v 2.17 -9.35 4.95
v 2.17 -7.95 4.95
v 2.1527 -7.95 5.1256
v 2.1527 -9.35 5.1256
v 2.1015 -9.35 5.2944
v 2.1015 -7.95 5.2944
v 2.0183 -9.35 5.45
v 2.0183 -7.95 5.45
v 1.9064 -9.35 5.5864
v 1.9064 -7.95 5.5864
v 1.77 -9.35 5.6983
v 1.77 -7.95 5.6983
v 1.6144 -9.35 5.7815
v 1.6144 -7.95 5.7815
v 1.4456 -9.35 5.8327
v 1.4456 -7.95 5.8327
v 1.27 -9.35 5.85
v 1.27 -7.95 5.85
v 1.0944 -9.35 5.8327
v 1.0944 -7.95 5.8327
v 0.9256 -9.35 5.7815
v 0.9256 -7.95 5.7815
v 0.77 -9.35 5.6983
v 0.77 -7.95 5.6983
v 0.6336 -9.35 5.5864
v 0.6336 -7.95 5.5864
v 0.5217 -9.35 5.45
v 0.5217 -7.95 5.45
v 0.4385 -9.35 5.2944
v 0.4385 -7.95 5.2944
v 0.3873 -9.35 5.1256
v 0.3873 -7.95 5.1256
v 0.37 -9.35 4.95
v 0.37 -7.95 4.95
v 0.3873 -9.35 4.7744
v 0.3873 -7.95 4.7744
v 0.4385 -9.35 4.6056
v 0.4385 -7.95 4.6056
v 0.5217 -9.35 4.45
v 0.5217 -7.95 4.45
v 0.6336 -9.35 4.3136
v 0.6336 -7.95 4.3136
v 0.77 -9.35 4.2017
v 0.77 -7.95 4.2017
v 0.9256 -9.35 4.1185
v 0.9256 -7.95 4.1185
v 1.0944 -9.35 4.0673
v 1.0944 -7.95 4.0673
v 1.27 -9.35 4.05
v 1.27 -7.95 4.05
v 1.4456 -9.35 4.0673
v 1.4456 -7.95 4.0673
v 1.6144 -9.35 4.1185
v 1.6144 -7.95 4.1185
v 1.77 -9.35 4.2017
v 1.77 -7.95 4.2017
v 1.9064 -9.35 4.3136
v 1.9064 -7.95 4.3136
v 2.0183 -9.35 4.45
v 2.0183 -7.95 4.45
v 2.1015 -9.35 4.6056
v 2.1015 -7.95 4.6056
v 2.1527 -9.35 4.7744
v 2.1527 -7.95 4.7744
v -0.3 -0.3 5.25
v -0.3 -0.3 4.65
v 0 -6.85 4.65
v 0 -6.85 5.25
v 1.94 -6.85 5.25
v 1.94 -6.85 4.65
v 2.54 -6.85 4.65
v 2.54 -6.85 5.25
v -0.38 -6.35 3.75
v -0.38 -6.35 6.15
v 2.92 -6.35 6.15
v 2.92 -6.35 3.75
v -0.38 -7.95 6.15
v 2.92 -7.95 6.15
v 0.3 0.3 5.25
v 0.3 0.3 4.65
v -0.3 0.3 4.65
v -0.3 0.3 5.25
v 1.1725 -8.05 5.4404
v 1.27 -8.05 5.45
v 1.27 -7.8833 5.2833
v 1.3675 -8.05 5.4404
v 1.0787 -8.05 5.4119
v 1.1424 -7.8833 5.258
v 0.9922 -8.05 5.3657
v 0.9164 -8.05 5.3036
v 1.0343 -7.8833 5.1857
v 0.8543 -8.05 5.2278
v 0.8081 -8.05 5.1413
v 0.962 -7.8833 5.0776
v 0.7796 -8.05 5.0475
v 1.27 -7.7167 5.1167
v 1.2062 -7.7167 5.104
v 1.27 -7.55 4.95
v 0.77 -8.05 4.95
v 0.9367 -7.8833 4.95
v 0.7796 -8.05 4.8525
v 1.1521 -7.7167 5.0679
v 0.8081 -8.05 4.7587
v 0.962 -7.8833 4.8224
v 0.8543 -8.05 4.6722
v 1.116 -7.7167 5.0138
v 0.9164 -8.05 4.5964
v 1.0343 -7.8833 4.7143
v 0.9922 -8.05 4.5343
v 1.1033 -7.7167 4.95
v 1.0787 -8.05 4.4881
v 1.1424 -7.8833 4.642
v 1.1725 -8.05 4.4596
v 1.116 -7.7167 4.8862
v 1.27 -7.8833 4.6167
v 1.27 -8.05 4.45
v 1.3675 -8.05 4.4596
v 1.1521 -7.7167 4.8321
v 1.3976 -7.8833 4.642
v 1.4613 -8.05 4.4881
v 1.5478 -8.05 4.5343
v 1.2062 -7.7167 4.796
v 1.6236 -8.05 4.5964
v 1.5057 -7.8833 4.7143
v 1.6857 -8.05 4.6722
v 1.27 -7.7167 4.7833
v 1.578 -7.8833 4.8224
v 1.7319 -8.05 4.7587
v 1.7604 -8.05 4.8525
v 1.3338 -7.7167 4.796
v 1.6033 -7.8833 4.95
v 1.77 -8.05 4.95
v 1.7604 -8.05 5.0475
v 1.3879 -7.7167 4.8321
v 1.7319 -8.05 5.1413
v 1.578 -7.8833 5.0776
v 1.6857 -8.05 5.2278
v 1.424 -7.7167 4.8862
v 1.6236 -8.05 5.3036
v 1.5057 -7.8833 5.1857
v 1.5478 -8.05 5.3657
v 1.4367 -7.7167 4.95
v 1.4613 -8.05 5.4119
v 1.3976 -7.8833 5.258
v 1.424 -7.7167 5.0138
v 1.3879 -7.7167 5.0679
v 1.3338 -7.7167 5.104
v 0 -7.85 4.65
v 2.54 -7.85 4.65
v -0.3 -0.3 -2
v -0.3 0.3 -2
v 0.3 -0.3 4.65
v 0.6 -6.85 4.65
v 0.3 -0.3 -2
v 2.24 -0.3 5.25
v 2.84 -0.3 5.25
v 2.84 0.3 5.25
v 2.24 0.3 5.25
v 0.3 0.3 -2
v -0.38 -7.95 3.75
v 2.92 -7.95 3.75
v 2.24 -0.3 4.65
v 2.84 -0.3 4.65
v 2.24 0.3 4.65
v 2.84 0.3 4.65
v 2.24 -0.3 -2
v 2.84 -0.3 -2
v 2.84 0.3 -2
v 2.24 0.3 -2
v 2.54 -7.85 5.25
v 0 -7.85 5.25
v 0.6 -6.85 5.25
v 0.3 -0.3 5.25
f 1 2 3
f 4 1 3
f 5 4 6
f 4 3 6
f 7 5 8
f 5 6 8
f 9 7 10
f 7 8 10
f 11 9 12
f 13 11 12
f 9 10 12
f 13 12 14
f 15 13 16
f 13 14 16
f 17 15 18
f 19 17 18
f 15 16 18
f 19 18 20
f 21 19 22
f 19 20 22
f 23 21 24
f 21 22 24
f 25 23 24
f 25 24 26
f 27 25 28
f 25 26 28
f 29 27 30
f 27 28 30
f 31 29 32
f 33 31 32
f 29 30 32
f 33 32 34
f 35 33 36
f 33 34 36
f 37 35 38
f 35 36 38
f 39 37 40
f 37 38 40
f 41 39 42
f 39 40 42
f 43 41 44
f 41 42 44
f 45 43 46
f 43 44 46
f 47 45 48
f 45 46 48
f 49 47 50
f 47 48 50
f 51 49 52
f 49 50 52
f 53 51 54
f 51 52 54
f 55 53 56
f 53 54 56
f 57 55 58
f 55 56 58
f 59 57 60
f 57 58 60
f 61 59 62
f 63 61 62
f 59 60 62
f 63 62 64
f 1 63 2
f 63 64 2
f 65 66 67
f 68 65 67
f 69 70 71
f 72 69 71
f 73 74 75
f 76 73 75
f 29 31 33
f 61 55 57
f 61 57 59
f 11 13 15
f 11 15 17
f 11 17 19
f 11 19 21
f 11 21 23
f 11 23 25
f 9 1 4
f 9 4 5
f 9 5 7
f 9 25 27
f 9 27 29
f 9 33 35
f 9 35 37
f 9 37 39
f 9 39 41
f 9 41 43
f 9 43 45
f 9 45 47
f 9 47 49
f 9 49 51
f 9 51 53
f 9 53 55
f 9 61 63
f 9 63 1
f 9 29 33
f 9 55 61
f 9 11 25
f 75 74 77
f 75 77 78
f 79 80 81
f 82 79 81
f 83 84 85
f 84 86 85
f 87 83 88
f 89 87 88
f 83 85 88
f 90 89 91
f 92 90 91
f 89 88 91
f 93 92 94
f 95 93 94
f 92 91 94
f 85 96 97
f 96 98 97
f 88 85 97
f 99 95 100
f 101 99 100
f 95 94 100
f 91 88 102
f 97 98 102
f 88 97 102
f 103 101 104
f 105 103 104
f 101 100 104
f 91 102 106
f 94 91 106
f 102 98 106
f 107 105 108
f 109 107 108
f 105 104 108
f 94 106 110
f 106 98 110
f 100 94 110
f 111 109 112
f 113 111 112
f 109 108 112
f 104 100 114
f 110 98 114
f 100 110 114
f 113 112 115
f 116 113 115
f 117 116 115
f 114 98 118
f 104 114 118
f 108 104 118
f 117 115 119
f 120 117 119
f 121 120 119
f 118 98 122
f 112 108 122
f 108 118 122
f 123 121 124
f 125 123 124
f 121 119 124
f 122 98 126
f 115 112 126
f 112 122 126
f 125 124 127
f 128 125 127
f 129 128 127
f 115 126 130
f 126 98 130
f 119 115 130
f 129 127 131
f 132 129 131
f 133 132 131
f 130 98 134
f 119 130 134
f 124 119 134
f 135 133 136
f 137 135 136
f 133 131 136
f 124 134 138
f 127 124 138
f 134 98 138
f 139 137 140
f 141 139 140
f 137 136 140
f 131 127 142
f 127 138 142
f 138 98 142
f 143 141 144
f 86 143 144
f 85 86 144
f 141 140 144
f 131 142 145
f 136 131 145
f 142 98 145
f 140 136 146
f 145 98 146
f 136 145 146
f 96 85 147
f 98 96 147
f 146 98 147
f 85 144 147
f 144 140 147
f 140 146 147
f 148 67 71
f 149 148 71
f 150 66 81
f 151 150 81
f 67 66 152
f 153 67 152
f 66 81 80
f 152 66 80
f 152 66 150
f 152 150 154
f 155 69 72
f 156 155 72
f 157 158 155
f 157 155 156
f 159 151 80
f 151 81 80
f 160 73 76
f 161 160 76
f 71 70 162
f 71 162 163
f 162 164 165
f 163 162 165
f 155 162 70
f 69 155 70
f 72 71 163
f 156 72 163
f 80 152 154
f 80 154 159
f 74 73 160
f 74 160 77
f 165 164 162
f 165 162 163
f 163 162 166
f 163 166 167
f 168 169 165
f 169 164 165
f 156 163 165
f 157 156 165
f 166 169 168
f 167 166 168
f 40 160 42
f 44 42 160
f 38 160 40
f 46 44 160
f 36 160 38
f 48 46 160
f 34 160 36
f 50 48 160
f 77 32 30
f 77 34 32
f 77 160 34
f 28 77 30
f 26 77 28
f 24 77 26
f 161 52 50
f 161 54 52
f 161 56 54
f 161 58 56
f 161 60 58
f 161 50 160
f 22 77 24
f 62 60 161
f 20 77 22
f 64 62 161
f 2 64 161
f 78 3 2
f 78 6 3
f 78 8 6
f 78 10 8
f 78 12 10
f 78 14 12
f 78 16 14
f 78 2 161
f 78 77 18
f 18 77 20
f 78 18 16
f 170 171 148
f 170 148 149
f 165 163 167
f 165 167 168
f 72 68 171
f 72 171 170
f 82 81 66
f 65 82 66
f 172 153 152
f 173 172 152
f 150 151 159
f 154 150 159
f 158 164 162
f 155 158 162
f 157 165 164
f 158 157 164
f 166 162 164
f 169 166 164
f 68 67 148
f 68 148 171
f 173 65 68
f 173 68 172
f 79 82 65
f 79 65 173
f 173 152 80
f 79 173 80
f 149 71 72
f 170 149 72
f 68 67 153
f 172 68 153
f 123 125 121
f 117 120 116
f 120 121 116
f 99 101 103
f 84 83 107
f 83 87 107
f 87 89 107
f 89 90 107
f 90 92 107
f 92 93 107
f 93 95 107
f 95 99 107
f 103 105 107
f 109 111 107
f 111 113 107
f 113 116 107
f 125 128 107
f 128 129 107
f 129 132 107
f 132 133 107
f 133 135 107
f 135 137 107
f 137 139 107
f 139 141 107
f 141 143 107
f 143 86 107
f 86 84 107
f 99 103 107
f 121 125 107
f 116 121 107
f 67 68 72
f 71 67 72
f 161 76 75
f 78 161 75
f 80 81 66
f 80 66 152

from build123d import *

# Parameters (mm, degrees)
SKETCH_W       = 0.6
SKETCH_H       = 0.6
PAD_DEPTH      = 4.65
PAD_DEPTH_BACK = 2
PAD001_DEPTH   = 0.6
SKETCH002_W    = 2.54
SKETCH002_H    = 0.6
PAD002_DEPTH   = 1
SKETCH004_W    = 3.3
SKETCH004_H    = 2.4
PAD003_DEPTH   = 1.6
SKETCH006_R    = 0.9
PAD004_DEPTH   = 1.4


with BuildPart() as pad:
    # Sketch → Pad (new body, two sides)
    with BuildSketch(Plane.XY) as pad_sk:
        Rectangle(SKETCH_W, SKETCH_H)
        with Locations((2.54, 0)):
            Rectangle(SKETCH_W, SKETCH_H)
    extrude(amount=PAD_DEPTH)
    extrude(pad_sk.sketch, amount=-PAD_DEPTH_BACK)


with BuildPart() as pad001:
    # Sketch001 → Pad001 (new body)
    with BuildSketch(Plane.XY.offset(4.65)):
        Polygon((0.3, 0.3), (-0.3, 0.3), (-0.3, -0.3), (0, -6.85), (0.6, -6.85), (0.3, -0.3), align=None)
        Polygon((2.84, 0.3), (2.24, 0.3), (2.24, -0.3), (1.94, -6.85), (2.54, -6.85), (2.84, -0.3), align=None)
    extrude(amount=PAD001_DEPTH)


with BuildPart() as pad002:
    # Sketch002 → Pad002 (new body)
    with BuildSketch(Plane.XZ.offset(6.85)):
        with Locations((1.27, 4.95)):
            Rectangle(SKETCH002_W, SKETCH002_H)
    extrude(amount=PAD002_DEPTH)


with BuildPart() as revolution001:
    # Sketch005 → Revolution001 (revolve)
    with BuildSketch(Plane.YZ.offset(1.27)):
        Polygon((-7.55, 4.95), (-8.05, 4.95), (-8.05, 5.45), align=None)
    revolve(axis=Axis((1.27, -3.977201, 4.95), (0, -1, 0)))


with BuildPart() as pad004:
    # Sketch004 → Pad003 (new body)
    with BuildSketch(Plane.XZ.offset(6.35)):
        with Locations((1.27, 4.95)):
            Rectangle(SKETCH004_W, SKETCH004_H)
    extrude(amount=PAD003_DEPTH)

    # Sketch006 → Pad004 (new body)
    with BuildSketch(Plane.XZ.offset(7.95)):
        with Locations((1.27, 4.95)):
            Circle(SKETCH006_R)
    extrude(amount=PAD004_DEPTH)


solid = Compound([pad.part, pad001.part, pad002.part, revolution001.part, pad004.part])
